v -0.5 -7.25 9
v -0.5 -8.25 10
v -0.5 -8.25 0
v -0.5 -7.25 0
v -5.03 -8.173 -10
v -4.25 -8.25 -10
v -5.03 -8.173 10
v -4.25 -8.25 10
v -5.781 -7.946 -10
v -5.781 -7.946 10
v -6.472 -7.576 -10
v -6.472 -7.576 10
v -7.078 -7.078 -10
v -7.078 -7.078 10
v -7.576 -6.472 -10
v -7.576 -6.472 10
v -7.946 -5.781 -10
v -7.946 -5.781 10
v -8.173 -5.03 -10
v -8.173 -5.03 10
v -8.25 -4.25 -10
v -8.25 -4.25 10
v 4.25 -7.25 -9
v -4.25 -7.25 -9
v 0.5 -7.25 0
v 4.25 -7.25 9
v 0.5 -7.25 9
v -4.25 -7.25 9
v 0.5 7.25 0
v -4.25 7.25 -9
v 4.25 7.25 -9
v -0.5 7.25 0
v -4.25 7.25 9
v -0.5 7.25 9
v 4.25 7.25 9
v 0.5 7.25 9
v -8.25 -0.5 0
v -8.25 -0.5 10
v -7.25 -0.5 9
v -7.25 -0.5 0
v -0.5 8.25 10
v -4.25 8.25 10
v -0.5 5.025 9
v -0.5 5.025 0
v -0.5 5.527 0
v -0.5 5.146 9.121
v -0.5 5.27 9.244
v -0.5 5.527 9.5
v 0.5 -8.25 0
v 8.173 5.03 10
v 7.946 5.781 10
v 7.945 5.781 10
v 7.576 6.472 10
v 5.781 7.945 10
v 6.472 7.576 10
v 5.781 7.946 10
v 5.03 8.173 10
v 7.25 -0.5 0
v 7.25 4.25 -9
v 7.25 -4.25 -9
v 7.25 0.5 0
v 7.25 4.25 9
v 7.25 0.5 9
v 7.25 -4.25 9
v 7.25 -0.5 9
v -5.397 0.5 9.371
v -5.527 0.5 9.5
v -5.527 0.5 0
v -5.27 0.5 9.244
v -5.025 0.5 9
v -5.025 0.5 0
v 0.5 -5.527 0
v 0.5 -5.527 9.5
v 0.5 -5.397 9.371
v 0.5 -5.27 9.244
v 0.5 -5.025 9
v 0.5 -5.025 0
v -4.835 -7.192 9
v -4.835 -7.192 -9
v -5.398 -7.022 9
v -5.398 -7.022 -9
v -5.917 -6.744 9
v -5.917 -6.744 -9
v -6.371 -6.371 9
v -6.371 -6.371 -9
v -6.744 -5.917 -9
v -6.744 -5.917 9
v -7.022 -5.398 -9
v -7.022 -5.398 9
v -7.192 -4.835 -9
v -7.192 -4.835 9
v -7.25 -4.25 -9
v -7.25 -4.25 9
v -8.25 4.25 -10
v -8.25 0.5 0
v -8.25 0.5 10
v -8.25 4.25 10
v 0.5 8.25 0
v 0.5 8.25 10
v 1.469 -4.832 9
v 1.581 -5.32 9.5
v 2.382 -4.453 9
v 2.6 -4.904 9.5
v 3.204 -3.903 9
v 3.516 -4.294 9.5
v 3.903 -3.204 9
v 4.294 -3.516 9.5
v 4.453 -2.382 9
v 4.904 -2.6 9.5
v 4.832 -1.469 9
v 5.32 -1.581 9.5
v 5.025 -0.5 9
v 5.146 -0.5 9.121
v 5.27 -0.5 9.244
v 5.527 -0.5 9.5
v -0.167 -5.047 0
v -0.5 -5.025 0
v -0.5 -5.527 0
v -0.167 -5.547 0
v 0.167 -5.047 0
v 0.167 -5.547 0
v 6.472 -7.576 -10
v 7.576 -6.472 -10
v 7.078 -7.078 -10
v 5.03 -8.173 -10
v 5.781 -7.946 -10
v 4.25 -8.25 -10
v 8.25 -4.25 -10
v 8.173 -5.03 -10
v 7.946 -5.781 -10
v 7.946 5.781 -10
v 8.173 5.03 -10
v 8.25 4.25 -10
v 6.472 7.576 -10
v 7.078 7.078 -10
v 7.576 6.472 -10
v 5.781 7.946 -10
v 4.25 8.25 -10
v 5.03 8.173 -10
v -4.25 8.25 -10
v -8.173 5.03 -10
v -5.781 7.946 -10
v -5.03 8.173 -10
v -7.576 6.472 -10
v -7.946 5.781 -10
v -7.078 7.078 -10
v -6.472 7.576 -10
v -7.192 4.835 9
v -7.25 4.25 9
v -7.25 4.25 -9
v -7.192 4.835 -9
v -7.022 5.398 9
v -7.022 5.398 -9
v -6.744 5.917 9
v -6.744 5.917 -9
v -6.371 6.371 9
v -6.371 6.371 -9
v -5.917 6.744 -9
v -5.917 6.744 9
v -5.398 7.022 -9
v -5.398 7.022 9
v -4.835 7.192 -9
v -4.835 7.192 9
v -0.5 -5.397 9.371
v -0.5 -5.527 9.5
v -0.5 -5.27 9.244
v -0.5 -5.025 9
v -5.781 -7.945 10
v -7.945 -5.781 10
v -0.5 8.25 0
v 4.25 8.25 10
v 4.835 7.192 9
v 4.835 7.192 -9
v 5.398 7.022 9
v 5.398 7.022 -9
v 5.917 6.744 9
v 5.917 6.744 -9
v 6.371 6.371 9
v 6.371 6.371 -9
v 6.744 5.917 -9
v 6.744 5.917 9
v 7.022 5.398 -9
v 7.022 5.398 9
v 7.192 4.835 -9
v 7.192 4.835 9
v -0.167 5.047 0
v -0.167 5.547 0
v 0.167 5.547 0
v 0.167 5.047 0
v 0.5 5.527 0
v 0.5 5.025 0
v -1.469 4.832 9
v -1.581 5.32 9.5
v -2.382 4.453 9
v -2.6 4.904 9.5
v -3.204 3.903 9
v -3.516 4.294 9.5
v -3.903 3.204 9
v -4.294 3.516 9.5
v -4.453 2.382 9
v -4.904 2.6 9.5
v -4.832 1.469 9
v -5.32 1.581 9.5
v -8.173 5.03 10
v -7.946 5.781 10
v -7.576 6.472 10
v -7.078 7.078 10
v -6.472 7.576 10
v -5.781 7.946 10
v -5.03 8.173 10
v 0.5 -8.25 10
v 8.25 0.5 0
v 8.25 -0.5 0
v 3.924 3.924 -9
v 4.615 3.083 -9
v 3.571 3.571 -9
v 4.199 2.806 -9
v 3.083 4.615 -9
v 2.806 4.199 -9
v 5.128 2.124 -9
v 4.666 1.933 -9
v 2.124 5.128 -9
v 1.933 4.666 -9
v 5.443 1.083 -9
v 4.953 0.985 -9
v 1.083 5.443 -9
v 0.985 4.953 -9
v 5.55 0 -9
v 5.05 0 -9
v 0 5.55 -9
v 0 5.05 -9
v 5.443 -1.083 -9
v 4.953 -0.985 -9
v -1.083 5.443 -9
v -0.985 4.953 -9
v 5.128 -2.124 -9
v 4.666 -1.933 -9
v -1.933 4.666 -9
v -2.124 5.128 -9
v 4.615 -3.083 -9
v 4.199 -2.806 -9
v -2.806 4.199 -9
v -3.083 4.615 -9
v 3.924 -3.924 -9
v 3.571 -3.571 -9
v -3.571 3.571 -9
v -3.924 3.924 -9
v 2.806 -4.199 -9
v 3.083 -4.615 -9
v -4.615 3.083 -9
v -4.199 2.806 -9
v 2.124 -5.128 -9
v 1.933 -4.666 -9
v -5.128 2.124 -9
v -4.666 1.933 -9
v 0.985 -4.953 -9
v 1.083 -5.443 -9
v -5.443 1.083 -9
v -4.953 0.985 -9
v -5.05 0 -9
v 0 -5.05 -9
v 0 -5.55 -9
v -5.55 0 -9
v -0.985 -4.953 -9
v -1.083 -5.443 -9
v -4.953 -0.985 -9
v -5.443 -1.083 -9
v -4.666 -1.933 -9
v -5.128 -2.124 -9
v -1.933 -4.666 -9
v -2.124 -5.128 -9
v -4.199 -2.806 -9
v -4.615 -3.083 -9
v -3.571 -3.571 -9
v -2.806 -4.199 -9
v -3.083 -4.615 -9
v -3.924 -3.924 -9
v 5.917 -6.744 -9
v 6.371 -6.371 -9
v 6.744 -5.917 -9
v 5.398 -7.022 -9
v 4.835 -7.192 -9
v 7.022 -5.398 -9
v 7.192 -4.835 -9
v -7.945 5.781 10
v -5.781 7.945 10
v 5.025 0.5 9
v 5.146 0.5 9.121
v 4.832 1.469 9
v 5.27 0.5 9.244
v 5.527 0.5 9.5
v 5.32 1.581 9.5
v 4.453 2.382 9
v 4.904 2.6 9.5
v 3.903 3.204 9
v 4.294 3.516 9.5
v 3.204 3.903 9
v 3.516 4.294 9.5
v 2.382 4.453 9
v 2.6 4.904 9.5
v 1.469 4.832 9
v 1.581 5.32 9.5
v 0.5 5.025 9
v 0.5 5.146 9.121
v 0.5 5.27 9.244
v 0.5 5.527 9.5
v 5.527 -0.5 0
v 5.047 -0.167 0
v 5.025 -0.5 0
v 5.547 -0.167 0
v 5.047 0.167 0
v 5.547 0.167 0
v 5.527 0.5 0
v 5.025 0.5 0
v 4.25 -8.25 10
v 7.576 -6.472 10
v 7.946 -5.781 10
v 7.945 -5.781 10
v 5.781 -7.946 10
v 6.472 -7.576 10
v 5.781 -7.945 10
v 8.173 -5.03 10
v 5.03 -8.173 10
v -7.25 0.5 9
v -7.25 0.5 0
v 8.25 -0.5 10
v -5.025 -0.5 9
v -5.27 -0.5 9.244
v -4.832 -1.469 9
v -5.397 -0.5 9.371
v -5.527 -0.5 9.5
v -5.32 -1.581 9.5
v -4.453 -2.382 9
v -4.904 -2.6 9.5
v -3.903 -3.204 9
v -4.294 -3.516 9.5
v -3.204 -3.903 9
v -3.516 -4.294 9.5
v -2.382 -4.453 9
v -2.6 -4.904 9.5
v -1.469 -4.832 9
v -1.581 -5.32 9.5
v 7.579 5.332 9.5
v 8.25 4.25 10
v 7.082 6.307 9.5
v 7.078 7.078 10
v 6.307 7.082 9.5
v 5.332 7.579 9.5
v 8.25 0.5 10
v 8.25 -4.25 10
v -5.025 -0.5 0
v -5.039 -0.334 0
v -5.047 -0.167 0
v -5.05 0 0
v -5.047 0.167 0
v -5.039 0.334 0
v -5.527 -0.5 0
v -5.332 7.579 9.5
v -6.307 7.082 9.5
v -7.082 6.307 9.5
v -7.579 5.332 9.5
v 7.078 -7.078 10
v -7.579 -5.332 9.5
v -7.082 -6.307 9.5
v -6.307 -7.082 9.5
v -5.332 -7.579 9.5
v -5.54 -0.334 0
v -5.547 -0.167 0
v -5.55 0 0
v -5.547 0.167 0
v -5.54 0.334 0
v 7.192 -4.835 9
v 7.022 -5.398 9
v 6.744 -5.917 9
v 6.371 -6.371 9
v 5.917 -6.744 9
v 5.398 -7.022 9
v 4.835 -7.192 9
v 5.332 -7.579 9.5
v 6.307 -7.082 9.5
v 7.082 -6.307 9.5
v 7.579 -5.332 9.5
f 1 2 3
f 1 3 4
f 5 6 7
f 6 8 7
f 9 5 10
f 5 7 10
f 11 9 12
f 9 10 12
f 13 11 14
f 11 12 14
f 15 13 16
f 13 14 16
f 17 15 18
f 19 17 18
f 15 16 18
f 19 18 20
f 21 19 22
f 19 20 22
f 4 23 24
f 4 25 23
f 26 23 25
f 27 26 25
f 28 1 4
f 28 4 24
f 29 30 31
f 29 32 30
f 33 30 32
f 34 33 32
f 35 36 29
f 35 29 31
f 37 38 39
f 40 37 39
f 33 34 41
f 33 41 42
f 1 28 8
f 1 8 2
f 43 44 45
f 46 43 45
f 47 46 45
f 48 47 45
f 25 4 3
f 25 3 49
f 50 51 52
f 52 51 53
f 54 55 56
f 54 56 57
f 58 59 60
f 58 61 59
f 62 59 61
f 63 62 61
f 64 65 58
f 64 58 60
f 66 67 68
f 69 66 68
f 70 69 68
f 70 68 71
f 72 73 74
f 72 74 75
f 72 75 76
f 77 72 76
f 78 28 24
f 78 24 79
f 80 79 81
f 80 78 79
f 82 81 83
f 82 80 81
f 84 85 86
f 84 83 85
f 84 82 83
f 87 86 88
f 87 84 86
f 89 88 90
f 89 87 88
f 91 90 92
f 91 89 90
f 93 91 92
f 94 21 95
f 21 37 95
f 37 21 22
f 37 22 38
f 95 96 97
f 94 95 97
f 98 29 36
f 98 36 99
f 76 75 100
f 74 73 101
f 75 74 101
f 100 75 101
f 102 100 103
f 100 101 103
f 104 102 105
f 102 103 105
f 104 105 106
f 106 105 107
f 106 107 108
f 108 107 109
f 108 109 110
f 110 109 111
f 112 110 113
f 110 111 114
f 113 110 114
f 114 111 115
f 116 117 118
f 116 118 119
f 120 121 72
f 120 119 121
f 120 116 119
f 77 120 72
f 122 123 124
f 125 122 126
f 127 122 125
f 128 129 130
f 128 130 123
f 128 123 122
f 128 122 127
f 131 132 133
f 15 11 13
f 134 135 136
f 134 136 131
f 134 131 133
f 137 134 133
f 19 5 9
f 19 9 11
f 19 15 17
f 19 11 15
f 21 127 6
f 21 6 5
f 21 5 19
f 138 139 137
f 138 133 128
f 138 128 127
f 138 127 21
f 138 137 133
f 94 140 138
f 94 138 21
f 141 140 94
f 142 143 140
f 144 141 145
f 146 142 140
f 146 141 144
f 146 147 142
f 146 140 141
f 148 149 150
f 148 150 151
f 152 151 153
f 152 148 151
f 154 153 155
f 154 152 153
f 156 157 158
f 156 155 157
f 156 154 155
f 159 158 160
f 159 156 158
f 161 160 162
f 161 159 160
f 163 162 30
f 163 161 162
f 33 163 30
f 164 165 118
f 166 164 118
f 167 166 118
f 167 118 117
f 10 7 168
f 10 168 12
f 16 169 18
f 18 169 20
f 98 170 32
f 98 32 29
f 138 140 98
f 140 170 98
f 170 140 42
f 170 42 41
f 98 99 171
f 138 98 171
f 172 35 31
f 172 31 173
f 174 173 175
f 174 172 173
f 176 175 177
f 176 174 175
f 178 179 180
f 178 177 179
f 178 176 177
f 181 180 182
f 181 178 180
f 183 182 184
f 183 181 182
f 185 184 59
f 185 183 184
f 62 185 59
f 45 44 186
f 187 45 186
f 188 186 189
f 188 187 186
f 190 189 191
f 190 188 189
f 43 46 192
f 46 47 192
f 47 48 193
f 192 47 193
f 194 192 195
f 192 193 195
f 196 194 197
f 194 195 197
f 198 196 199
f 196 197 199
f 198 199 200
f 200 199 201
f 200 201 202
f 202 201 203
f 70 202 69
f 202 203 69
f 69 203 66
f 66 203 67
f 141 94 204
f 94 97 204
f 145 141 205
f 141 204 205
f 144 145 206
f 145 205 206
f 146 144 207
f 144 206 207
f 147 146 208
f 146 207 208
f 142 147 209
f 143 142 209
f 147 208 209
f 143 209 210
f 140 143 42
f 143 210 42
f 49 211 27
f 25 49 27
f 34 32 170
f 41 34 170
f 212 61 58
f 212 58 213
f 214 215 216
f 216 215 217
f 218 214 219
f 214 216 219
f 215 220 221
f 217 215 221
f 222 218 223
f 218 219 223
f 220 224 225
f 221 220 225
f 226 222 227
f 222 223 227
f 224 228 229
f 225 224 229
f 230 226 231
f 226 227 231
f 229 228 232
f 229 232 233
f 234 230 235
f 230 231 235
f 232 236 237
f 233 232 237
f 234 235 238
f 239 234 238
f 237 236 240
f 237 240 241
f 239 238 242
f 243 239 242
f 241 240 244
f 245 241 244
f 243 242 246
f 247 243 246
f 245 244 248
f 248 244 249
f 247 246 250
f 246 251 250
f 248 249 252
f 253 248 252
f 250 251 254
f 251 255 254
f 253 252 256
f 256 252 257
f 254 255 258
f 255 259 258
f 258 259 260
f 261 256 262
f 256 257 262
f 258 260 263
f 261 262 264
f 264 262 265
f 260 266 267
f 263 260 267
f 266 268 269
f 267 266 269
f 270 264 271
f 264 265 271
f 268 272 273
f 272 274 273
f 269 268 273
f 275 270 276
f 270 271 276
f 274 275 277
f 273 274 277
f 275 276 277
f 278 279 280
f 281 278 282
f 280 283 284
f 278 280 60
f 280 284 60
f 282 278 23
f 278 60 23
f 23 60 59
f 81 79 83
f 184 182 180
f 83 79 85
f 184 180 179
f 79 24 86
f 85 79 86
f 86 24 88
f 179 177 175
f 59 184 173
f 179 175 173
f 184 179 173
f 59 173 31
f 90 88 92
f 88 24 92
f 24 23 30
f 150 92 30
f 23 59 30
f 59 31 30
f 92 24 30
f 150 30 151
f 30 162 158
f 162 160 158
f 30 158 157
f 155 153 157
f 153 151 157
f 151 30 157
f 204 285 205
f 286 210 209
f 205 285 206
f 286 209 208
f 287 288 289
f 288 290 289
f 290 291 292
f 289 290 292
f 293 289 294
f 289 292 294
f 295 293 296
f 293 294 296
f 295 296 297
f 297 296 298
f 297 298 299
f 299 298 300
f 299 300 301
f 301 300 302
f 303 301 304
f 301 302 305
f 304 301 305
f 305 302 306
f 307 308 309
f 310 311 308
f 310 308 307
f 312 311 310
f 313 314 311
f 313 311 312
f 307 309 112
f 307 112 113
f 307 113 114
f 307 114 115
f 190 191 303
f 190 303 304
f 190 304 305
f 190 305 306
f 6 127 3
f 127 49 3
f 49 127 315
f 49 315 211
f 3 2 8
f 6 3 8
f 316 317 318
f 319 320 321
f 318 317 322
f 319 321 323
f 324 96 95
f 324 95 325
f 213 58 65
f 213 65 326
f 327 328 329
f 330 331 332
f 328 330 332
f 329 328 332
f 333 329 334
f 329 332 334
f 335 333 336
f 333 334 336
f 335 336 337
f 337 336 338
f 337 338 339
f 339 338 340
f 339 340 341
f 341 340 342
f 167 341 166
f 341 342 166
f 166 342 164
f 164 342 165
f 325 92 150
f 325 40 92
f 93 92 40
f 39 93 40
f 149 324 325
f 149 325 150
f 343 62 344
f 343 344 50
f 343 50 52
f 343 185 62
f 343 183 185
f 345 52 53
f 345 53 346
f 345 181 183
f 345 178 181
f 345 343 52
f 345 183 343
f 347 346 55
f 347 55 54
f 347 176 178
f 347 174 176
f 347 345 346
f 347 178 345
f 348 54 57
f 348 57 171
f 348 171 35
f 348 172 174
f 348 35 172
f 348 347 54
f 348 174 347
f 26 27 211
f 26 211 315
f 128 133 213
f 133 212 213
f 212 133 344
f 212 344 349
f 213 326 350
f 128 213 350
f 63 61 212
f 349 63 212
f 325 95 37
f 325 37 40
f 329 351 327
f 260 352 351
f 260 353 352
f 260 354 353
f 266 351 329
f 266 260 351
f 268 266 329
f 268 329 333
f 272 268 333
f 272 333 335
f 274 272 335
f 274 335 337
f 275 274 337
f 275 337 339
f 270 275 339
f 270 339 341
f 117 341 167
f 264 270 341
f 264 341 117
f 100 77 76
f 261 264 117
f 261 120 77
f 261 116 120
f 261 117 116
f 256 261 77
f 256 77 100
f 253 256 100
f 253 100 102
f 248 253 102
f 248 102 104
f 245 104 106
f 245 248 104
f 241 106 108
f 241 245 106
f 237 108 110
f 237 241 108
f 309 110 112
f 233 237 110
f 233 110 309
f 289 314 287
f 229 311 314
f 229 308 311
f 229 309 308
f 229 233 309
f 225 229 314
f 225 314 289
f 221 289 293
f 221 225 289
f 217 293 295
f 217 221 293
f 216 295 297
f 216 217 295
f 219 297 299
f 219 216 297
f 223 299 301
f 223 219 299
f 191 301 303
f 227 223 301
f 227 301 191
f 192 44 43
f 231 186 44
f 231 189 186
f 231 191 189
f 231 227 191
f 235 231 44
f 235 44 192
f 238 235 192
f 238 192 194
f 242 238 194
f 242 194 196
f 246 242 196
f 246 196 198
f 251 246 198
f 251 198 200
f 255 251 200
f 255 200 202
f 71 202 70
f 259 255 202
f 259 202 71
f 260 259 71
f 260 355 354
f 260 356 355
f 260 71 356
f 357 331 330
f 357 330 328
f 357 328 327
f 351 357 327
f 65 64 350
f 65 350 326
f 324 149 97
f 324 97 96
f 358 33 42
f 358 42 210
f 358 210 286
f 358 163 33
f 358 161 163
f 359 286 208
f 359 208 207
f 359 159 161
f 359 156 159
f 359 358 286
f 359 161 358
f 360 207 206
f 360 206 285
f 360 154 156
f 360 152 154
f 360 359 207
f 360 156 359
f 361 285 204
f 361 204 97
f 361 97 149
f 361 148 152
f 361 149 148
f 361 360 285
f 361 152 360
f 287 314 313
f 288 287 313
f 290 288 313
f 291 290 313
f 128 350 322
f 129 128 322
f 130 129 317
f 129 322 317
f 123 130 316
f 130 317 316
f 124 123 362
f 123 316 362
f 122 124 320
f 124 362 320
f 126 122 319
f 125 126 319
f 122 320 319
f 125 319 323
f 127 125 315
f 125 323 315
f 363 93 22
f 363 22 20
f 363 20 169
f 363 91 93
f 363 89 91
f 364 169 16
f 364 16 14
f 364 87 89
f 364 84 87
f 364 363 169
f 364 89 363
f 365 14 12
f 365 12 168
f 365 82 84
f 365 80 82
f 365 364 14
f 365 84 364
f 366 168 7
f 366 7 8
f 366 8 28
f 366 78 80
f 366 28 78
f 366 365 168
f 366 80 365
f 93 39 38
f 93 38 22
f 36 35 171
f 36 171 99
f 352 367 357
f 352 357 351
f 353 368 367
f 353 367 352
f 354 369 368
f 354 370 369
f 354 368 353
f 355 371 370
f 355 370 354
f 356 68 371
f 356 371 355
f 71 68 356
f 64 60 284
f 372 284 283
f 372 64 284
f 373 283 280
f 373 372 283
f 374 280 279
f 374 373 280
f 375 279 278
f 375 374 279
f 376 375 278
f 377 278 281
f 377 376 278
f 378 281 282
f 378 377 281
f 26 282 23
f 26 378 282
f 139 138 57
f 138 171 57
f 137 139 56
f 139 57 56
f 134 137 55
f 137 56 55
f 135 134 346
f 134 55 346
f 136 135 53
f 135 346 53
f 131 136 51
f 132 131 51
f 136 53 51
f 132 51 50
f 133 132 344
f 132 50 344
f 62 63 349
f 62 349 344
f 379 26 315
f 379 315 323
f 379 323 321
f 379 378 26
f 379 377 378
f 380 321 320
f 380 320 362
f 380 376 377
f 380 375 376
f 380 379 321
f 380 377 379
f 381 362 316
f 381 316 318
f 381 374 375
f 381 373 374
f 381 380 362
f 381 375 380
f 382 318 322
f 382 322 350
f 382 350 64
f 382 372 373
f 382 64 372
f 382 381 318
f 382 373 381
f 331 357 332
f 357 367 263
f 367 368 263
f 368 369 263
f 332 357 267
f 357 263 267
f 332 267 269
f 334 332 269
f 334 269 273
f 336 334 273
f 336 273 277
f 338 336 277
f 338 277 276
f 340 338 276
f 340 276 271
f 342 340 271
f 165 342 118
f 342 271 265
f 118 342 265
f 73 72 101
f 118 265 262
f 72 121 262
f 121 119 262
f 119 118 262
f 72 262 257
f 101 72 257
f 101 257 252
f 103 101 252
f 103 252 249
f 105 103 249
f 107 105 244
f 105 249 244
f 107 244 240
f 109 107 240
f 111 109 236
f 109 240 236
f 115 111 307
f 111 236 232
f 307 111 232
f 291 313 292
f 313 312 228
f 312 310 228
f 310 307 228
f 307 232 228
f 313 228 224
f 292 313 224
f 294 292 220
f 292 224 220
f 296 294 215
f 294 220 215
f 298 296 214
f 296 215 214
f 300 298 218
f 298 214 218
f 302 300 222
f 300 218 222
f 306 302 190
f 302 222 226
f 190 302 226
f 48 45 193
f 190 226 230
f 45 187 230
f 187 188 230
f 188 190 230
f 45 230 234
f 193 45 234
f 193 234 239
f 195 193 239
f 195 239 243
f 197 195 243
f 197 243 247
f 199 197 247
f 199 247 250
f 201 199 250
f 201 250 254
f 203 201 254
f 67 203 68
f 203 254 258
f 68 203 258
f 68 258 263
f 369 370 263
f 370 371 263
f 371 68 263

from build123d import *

# Parameters (mm, degrees)
BOSS_EXTRUDE1_DEPTH = 10
SHELL7_T            = -1
SKETCH4_R           = 5.55
SKETCH4_R_2         = 5.05
BOSS_EXTRUDE2_DEPTH = 19
CHAMFER2_SIZE       = 1
CHAMFER4_SIZE       = 1
SKETCH10_W          = 1
SKETCH10_H          = 10
SKETCH10_W_2        = 10
SKETCH10_H_2        = 1
CUT_EXTRUDE2_DEPTH  = 10


# Some blends are built 0.0001 mm under size
with BuildPart() as part:
    # Sketch2 → Boss-Extrude1 (new, symmetric)
    with BuildSketch(Plane.XY):
        with BuildLine():
            Line((4.25, -8.25), (-4.25, -8.25))
            ThreePointArc((-4.25, -8.25), (-7.078427125, -7.078427125), (-8.25, -4.25))
            Line((-8.25, -4.25), (-8.25, 4.25))
            ThreePointArc((-8.25, 4.25), (-7.078427125, 7.078427125), (-4.25, 8.25))
            Line((-4.25, 8.25), (4.25, 8.25))
            ThreePointArc((4.25, 8.25), (7.078427125, 7.078427125), (8.25, 4.25))
            Line((8.25, 4.25), (8.25, -4.25))
            ThreePointArc((8.25, -4.25), (7.078427125, -7.078427125), (4.25, -8.25))
        make_face()
    extrude(amount=BOSS_EXTRUDE1_DEPTH, both=True)

    # Shell7
    shell7_openings = [part.faces().sort_by_distance(p)[0] for p in [
        (0, 0, 10),
    ]]
    offset(amount=SHELL7_T, openings=shell7_openings, kind=Kind.INTERSECTION)

    # Chamfer4
    chamfer4_edges = [part.edges().sort_by_distance(p)[0] for p in [
        (6.371320344, 6.371320344, 10),
        (-7.25, 0, 10),
        (0, -7.25, 10),
        (6.371320344, -6.371320344, 10),
        (0, 7.25, 10),
        (-6.371320344, 6.371320344, 10),
        (-6.371320344, -6.371320344, 10),
        (7.25, 0, 10),
    ]]
    chamfer(chamfer4_edges, length=CHAMFER4_SIZE - 0.0001)  # a hair under: the kernel refuses the full size


with BuildPart() as body_2:
    # Sketch4 → Boss-Extrude2 (new body)
    with BuildSketch(Plane.XY.offset(-9)):
        with Locations(Location((0, 0, 0), (0, 0, 180))):
            Circle(SKETCH4_R)
        with Locations(Location((0, 0, 0), (0, 0, 180))):
            Circle(SKETCH4_R_2, mode=Mode.SUBTRACT)
    extrude(amount=BOSS_EXTRUDE2_DEPTH)

    # Chamfer2
    # the kernel refuses this chamfer: 1 mm, written as the material it takes off along each edge
    with BuildSketch(Plane(origin=(0, 0, 10), x_dir=(-1, 0, 0), z_dir=(0, 1, 0))) as chamfer2_piece_1:
        Polygon((5.05, -CHAMFER2_SIZE), (5.05 + CHAMFER2_SIZE, 0), (5.05, 0), align=None)
    revolve(axis=Axis((0, 0, 10), (0, 0, 1)), mode=Mode.SUBTRACT)


with BuildPart() as cut_extrude2_tool:
    # Sketch10 → Cut-Extrude2 (new body)
    with BuildSketch(Plane.XY):
        with Locations((0, 8)):
            Rectangle(SKETCH10_W, SKETCH10_H)
        with Locations((8, 0)):
            Rectangle(SKETCH10_W_2, SKETCH10_H_2)
        with Locations((0, -8)):
            Rectangle(SKETCH10_W, SKETCH10_H)
        with Locations((-8, 0)):
            Rectangle(SKETCH10_W_2, SKETCH10_H_2)
    extrude(amount=CUT_EXTRUDE2_DEPTH)


with BuildPart() as part_1:
    add(part.part)

    # Cut-Extrude2: cut by cut_extrude2_tool
    add(cut_extrude2_tool.part, mode=Mode.SUBTRACT)


with BuildPart() as body_2_1:
    add(body_2.part)

    # Cut-Extrude2: cut by cut_extrude2_tool
    add(cut_extrude2_tool.part, mode=Mode.SUBTRACT)


solid = Compound([part_1.part, body_2_1.part])
